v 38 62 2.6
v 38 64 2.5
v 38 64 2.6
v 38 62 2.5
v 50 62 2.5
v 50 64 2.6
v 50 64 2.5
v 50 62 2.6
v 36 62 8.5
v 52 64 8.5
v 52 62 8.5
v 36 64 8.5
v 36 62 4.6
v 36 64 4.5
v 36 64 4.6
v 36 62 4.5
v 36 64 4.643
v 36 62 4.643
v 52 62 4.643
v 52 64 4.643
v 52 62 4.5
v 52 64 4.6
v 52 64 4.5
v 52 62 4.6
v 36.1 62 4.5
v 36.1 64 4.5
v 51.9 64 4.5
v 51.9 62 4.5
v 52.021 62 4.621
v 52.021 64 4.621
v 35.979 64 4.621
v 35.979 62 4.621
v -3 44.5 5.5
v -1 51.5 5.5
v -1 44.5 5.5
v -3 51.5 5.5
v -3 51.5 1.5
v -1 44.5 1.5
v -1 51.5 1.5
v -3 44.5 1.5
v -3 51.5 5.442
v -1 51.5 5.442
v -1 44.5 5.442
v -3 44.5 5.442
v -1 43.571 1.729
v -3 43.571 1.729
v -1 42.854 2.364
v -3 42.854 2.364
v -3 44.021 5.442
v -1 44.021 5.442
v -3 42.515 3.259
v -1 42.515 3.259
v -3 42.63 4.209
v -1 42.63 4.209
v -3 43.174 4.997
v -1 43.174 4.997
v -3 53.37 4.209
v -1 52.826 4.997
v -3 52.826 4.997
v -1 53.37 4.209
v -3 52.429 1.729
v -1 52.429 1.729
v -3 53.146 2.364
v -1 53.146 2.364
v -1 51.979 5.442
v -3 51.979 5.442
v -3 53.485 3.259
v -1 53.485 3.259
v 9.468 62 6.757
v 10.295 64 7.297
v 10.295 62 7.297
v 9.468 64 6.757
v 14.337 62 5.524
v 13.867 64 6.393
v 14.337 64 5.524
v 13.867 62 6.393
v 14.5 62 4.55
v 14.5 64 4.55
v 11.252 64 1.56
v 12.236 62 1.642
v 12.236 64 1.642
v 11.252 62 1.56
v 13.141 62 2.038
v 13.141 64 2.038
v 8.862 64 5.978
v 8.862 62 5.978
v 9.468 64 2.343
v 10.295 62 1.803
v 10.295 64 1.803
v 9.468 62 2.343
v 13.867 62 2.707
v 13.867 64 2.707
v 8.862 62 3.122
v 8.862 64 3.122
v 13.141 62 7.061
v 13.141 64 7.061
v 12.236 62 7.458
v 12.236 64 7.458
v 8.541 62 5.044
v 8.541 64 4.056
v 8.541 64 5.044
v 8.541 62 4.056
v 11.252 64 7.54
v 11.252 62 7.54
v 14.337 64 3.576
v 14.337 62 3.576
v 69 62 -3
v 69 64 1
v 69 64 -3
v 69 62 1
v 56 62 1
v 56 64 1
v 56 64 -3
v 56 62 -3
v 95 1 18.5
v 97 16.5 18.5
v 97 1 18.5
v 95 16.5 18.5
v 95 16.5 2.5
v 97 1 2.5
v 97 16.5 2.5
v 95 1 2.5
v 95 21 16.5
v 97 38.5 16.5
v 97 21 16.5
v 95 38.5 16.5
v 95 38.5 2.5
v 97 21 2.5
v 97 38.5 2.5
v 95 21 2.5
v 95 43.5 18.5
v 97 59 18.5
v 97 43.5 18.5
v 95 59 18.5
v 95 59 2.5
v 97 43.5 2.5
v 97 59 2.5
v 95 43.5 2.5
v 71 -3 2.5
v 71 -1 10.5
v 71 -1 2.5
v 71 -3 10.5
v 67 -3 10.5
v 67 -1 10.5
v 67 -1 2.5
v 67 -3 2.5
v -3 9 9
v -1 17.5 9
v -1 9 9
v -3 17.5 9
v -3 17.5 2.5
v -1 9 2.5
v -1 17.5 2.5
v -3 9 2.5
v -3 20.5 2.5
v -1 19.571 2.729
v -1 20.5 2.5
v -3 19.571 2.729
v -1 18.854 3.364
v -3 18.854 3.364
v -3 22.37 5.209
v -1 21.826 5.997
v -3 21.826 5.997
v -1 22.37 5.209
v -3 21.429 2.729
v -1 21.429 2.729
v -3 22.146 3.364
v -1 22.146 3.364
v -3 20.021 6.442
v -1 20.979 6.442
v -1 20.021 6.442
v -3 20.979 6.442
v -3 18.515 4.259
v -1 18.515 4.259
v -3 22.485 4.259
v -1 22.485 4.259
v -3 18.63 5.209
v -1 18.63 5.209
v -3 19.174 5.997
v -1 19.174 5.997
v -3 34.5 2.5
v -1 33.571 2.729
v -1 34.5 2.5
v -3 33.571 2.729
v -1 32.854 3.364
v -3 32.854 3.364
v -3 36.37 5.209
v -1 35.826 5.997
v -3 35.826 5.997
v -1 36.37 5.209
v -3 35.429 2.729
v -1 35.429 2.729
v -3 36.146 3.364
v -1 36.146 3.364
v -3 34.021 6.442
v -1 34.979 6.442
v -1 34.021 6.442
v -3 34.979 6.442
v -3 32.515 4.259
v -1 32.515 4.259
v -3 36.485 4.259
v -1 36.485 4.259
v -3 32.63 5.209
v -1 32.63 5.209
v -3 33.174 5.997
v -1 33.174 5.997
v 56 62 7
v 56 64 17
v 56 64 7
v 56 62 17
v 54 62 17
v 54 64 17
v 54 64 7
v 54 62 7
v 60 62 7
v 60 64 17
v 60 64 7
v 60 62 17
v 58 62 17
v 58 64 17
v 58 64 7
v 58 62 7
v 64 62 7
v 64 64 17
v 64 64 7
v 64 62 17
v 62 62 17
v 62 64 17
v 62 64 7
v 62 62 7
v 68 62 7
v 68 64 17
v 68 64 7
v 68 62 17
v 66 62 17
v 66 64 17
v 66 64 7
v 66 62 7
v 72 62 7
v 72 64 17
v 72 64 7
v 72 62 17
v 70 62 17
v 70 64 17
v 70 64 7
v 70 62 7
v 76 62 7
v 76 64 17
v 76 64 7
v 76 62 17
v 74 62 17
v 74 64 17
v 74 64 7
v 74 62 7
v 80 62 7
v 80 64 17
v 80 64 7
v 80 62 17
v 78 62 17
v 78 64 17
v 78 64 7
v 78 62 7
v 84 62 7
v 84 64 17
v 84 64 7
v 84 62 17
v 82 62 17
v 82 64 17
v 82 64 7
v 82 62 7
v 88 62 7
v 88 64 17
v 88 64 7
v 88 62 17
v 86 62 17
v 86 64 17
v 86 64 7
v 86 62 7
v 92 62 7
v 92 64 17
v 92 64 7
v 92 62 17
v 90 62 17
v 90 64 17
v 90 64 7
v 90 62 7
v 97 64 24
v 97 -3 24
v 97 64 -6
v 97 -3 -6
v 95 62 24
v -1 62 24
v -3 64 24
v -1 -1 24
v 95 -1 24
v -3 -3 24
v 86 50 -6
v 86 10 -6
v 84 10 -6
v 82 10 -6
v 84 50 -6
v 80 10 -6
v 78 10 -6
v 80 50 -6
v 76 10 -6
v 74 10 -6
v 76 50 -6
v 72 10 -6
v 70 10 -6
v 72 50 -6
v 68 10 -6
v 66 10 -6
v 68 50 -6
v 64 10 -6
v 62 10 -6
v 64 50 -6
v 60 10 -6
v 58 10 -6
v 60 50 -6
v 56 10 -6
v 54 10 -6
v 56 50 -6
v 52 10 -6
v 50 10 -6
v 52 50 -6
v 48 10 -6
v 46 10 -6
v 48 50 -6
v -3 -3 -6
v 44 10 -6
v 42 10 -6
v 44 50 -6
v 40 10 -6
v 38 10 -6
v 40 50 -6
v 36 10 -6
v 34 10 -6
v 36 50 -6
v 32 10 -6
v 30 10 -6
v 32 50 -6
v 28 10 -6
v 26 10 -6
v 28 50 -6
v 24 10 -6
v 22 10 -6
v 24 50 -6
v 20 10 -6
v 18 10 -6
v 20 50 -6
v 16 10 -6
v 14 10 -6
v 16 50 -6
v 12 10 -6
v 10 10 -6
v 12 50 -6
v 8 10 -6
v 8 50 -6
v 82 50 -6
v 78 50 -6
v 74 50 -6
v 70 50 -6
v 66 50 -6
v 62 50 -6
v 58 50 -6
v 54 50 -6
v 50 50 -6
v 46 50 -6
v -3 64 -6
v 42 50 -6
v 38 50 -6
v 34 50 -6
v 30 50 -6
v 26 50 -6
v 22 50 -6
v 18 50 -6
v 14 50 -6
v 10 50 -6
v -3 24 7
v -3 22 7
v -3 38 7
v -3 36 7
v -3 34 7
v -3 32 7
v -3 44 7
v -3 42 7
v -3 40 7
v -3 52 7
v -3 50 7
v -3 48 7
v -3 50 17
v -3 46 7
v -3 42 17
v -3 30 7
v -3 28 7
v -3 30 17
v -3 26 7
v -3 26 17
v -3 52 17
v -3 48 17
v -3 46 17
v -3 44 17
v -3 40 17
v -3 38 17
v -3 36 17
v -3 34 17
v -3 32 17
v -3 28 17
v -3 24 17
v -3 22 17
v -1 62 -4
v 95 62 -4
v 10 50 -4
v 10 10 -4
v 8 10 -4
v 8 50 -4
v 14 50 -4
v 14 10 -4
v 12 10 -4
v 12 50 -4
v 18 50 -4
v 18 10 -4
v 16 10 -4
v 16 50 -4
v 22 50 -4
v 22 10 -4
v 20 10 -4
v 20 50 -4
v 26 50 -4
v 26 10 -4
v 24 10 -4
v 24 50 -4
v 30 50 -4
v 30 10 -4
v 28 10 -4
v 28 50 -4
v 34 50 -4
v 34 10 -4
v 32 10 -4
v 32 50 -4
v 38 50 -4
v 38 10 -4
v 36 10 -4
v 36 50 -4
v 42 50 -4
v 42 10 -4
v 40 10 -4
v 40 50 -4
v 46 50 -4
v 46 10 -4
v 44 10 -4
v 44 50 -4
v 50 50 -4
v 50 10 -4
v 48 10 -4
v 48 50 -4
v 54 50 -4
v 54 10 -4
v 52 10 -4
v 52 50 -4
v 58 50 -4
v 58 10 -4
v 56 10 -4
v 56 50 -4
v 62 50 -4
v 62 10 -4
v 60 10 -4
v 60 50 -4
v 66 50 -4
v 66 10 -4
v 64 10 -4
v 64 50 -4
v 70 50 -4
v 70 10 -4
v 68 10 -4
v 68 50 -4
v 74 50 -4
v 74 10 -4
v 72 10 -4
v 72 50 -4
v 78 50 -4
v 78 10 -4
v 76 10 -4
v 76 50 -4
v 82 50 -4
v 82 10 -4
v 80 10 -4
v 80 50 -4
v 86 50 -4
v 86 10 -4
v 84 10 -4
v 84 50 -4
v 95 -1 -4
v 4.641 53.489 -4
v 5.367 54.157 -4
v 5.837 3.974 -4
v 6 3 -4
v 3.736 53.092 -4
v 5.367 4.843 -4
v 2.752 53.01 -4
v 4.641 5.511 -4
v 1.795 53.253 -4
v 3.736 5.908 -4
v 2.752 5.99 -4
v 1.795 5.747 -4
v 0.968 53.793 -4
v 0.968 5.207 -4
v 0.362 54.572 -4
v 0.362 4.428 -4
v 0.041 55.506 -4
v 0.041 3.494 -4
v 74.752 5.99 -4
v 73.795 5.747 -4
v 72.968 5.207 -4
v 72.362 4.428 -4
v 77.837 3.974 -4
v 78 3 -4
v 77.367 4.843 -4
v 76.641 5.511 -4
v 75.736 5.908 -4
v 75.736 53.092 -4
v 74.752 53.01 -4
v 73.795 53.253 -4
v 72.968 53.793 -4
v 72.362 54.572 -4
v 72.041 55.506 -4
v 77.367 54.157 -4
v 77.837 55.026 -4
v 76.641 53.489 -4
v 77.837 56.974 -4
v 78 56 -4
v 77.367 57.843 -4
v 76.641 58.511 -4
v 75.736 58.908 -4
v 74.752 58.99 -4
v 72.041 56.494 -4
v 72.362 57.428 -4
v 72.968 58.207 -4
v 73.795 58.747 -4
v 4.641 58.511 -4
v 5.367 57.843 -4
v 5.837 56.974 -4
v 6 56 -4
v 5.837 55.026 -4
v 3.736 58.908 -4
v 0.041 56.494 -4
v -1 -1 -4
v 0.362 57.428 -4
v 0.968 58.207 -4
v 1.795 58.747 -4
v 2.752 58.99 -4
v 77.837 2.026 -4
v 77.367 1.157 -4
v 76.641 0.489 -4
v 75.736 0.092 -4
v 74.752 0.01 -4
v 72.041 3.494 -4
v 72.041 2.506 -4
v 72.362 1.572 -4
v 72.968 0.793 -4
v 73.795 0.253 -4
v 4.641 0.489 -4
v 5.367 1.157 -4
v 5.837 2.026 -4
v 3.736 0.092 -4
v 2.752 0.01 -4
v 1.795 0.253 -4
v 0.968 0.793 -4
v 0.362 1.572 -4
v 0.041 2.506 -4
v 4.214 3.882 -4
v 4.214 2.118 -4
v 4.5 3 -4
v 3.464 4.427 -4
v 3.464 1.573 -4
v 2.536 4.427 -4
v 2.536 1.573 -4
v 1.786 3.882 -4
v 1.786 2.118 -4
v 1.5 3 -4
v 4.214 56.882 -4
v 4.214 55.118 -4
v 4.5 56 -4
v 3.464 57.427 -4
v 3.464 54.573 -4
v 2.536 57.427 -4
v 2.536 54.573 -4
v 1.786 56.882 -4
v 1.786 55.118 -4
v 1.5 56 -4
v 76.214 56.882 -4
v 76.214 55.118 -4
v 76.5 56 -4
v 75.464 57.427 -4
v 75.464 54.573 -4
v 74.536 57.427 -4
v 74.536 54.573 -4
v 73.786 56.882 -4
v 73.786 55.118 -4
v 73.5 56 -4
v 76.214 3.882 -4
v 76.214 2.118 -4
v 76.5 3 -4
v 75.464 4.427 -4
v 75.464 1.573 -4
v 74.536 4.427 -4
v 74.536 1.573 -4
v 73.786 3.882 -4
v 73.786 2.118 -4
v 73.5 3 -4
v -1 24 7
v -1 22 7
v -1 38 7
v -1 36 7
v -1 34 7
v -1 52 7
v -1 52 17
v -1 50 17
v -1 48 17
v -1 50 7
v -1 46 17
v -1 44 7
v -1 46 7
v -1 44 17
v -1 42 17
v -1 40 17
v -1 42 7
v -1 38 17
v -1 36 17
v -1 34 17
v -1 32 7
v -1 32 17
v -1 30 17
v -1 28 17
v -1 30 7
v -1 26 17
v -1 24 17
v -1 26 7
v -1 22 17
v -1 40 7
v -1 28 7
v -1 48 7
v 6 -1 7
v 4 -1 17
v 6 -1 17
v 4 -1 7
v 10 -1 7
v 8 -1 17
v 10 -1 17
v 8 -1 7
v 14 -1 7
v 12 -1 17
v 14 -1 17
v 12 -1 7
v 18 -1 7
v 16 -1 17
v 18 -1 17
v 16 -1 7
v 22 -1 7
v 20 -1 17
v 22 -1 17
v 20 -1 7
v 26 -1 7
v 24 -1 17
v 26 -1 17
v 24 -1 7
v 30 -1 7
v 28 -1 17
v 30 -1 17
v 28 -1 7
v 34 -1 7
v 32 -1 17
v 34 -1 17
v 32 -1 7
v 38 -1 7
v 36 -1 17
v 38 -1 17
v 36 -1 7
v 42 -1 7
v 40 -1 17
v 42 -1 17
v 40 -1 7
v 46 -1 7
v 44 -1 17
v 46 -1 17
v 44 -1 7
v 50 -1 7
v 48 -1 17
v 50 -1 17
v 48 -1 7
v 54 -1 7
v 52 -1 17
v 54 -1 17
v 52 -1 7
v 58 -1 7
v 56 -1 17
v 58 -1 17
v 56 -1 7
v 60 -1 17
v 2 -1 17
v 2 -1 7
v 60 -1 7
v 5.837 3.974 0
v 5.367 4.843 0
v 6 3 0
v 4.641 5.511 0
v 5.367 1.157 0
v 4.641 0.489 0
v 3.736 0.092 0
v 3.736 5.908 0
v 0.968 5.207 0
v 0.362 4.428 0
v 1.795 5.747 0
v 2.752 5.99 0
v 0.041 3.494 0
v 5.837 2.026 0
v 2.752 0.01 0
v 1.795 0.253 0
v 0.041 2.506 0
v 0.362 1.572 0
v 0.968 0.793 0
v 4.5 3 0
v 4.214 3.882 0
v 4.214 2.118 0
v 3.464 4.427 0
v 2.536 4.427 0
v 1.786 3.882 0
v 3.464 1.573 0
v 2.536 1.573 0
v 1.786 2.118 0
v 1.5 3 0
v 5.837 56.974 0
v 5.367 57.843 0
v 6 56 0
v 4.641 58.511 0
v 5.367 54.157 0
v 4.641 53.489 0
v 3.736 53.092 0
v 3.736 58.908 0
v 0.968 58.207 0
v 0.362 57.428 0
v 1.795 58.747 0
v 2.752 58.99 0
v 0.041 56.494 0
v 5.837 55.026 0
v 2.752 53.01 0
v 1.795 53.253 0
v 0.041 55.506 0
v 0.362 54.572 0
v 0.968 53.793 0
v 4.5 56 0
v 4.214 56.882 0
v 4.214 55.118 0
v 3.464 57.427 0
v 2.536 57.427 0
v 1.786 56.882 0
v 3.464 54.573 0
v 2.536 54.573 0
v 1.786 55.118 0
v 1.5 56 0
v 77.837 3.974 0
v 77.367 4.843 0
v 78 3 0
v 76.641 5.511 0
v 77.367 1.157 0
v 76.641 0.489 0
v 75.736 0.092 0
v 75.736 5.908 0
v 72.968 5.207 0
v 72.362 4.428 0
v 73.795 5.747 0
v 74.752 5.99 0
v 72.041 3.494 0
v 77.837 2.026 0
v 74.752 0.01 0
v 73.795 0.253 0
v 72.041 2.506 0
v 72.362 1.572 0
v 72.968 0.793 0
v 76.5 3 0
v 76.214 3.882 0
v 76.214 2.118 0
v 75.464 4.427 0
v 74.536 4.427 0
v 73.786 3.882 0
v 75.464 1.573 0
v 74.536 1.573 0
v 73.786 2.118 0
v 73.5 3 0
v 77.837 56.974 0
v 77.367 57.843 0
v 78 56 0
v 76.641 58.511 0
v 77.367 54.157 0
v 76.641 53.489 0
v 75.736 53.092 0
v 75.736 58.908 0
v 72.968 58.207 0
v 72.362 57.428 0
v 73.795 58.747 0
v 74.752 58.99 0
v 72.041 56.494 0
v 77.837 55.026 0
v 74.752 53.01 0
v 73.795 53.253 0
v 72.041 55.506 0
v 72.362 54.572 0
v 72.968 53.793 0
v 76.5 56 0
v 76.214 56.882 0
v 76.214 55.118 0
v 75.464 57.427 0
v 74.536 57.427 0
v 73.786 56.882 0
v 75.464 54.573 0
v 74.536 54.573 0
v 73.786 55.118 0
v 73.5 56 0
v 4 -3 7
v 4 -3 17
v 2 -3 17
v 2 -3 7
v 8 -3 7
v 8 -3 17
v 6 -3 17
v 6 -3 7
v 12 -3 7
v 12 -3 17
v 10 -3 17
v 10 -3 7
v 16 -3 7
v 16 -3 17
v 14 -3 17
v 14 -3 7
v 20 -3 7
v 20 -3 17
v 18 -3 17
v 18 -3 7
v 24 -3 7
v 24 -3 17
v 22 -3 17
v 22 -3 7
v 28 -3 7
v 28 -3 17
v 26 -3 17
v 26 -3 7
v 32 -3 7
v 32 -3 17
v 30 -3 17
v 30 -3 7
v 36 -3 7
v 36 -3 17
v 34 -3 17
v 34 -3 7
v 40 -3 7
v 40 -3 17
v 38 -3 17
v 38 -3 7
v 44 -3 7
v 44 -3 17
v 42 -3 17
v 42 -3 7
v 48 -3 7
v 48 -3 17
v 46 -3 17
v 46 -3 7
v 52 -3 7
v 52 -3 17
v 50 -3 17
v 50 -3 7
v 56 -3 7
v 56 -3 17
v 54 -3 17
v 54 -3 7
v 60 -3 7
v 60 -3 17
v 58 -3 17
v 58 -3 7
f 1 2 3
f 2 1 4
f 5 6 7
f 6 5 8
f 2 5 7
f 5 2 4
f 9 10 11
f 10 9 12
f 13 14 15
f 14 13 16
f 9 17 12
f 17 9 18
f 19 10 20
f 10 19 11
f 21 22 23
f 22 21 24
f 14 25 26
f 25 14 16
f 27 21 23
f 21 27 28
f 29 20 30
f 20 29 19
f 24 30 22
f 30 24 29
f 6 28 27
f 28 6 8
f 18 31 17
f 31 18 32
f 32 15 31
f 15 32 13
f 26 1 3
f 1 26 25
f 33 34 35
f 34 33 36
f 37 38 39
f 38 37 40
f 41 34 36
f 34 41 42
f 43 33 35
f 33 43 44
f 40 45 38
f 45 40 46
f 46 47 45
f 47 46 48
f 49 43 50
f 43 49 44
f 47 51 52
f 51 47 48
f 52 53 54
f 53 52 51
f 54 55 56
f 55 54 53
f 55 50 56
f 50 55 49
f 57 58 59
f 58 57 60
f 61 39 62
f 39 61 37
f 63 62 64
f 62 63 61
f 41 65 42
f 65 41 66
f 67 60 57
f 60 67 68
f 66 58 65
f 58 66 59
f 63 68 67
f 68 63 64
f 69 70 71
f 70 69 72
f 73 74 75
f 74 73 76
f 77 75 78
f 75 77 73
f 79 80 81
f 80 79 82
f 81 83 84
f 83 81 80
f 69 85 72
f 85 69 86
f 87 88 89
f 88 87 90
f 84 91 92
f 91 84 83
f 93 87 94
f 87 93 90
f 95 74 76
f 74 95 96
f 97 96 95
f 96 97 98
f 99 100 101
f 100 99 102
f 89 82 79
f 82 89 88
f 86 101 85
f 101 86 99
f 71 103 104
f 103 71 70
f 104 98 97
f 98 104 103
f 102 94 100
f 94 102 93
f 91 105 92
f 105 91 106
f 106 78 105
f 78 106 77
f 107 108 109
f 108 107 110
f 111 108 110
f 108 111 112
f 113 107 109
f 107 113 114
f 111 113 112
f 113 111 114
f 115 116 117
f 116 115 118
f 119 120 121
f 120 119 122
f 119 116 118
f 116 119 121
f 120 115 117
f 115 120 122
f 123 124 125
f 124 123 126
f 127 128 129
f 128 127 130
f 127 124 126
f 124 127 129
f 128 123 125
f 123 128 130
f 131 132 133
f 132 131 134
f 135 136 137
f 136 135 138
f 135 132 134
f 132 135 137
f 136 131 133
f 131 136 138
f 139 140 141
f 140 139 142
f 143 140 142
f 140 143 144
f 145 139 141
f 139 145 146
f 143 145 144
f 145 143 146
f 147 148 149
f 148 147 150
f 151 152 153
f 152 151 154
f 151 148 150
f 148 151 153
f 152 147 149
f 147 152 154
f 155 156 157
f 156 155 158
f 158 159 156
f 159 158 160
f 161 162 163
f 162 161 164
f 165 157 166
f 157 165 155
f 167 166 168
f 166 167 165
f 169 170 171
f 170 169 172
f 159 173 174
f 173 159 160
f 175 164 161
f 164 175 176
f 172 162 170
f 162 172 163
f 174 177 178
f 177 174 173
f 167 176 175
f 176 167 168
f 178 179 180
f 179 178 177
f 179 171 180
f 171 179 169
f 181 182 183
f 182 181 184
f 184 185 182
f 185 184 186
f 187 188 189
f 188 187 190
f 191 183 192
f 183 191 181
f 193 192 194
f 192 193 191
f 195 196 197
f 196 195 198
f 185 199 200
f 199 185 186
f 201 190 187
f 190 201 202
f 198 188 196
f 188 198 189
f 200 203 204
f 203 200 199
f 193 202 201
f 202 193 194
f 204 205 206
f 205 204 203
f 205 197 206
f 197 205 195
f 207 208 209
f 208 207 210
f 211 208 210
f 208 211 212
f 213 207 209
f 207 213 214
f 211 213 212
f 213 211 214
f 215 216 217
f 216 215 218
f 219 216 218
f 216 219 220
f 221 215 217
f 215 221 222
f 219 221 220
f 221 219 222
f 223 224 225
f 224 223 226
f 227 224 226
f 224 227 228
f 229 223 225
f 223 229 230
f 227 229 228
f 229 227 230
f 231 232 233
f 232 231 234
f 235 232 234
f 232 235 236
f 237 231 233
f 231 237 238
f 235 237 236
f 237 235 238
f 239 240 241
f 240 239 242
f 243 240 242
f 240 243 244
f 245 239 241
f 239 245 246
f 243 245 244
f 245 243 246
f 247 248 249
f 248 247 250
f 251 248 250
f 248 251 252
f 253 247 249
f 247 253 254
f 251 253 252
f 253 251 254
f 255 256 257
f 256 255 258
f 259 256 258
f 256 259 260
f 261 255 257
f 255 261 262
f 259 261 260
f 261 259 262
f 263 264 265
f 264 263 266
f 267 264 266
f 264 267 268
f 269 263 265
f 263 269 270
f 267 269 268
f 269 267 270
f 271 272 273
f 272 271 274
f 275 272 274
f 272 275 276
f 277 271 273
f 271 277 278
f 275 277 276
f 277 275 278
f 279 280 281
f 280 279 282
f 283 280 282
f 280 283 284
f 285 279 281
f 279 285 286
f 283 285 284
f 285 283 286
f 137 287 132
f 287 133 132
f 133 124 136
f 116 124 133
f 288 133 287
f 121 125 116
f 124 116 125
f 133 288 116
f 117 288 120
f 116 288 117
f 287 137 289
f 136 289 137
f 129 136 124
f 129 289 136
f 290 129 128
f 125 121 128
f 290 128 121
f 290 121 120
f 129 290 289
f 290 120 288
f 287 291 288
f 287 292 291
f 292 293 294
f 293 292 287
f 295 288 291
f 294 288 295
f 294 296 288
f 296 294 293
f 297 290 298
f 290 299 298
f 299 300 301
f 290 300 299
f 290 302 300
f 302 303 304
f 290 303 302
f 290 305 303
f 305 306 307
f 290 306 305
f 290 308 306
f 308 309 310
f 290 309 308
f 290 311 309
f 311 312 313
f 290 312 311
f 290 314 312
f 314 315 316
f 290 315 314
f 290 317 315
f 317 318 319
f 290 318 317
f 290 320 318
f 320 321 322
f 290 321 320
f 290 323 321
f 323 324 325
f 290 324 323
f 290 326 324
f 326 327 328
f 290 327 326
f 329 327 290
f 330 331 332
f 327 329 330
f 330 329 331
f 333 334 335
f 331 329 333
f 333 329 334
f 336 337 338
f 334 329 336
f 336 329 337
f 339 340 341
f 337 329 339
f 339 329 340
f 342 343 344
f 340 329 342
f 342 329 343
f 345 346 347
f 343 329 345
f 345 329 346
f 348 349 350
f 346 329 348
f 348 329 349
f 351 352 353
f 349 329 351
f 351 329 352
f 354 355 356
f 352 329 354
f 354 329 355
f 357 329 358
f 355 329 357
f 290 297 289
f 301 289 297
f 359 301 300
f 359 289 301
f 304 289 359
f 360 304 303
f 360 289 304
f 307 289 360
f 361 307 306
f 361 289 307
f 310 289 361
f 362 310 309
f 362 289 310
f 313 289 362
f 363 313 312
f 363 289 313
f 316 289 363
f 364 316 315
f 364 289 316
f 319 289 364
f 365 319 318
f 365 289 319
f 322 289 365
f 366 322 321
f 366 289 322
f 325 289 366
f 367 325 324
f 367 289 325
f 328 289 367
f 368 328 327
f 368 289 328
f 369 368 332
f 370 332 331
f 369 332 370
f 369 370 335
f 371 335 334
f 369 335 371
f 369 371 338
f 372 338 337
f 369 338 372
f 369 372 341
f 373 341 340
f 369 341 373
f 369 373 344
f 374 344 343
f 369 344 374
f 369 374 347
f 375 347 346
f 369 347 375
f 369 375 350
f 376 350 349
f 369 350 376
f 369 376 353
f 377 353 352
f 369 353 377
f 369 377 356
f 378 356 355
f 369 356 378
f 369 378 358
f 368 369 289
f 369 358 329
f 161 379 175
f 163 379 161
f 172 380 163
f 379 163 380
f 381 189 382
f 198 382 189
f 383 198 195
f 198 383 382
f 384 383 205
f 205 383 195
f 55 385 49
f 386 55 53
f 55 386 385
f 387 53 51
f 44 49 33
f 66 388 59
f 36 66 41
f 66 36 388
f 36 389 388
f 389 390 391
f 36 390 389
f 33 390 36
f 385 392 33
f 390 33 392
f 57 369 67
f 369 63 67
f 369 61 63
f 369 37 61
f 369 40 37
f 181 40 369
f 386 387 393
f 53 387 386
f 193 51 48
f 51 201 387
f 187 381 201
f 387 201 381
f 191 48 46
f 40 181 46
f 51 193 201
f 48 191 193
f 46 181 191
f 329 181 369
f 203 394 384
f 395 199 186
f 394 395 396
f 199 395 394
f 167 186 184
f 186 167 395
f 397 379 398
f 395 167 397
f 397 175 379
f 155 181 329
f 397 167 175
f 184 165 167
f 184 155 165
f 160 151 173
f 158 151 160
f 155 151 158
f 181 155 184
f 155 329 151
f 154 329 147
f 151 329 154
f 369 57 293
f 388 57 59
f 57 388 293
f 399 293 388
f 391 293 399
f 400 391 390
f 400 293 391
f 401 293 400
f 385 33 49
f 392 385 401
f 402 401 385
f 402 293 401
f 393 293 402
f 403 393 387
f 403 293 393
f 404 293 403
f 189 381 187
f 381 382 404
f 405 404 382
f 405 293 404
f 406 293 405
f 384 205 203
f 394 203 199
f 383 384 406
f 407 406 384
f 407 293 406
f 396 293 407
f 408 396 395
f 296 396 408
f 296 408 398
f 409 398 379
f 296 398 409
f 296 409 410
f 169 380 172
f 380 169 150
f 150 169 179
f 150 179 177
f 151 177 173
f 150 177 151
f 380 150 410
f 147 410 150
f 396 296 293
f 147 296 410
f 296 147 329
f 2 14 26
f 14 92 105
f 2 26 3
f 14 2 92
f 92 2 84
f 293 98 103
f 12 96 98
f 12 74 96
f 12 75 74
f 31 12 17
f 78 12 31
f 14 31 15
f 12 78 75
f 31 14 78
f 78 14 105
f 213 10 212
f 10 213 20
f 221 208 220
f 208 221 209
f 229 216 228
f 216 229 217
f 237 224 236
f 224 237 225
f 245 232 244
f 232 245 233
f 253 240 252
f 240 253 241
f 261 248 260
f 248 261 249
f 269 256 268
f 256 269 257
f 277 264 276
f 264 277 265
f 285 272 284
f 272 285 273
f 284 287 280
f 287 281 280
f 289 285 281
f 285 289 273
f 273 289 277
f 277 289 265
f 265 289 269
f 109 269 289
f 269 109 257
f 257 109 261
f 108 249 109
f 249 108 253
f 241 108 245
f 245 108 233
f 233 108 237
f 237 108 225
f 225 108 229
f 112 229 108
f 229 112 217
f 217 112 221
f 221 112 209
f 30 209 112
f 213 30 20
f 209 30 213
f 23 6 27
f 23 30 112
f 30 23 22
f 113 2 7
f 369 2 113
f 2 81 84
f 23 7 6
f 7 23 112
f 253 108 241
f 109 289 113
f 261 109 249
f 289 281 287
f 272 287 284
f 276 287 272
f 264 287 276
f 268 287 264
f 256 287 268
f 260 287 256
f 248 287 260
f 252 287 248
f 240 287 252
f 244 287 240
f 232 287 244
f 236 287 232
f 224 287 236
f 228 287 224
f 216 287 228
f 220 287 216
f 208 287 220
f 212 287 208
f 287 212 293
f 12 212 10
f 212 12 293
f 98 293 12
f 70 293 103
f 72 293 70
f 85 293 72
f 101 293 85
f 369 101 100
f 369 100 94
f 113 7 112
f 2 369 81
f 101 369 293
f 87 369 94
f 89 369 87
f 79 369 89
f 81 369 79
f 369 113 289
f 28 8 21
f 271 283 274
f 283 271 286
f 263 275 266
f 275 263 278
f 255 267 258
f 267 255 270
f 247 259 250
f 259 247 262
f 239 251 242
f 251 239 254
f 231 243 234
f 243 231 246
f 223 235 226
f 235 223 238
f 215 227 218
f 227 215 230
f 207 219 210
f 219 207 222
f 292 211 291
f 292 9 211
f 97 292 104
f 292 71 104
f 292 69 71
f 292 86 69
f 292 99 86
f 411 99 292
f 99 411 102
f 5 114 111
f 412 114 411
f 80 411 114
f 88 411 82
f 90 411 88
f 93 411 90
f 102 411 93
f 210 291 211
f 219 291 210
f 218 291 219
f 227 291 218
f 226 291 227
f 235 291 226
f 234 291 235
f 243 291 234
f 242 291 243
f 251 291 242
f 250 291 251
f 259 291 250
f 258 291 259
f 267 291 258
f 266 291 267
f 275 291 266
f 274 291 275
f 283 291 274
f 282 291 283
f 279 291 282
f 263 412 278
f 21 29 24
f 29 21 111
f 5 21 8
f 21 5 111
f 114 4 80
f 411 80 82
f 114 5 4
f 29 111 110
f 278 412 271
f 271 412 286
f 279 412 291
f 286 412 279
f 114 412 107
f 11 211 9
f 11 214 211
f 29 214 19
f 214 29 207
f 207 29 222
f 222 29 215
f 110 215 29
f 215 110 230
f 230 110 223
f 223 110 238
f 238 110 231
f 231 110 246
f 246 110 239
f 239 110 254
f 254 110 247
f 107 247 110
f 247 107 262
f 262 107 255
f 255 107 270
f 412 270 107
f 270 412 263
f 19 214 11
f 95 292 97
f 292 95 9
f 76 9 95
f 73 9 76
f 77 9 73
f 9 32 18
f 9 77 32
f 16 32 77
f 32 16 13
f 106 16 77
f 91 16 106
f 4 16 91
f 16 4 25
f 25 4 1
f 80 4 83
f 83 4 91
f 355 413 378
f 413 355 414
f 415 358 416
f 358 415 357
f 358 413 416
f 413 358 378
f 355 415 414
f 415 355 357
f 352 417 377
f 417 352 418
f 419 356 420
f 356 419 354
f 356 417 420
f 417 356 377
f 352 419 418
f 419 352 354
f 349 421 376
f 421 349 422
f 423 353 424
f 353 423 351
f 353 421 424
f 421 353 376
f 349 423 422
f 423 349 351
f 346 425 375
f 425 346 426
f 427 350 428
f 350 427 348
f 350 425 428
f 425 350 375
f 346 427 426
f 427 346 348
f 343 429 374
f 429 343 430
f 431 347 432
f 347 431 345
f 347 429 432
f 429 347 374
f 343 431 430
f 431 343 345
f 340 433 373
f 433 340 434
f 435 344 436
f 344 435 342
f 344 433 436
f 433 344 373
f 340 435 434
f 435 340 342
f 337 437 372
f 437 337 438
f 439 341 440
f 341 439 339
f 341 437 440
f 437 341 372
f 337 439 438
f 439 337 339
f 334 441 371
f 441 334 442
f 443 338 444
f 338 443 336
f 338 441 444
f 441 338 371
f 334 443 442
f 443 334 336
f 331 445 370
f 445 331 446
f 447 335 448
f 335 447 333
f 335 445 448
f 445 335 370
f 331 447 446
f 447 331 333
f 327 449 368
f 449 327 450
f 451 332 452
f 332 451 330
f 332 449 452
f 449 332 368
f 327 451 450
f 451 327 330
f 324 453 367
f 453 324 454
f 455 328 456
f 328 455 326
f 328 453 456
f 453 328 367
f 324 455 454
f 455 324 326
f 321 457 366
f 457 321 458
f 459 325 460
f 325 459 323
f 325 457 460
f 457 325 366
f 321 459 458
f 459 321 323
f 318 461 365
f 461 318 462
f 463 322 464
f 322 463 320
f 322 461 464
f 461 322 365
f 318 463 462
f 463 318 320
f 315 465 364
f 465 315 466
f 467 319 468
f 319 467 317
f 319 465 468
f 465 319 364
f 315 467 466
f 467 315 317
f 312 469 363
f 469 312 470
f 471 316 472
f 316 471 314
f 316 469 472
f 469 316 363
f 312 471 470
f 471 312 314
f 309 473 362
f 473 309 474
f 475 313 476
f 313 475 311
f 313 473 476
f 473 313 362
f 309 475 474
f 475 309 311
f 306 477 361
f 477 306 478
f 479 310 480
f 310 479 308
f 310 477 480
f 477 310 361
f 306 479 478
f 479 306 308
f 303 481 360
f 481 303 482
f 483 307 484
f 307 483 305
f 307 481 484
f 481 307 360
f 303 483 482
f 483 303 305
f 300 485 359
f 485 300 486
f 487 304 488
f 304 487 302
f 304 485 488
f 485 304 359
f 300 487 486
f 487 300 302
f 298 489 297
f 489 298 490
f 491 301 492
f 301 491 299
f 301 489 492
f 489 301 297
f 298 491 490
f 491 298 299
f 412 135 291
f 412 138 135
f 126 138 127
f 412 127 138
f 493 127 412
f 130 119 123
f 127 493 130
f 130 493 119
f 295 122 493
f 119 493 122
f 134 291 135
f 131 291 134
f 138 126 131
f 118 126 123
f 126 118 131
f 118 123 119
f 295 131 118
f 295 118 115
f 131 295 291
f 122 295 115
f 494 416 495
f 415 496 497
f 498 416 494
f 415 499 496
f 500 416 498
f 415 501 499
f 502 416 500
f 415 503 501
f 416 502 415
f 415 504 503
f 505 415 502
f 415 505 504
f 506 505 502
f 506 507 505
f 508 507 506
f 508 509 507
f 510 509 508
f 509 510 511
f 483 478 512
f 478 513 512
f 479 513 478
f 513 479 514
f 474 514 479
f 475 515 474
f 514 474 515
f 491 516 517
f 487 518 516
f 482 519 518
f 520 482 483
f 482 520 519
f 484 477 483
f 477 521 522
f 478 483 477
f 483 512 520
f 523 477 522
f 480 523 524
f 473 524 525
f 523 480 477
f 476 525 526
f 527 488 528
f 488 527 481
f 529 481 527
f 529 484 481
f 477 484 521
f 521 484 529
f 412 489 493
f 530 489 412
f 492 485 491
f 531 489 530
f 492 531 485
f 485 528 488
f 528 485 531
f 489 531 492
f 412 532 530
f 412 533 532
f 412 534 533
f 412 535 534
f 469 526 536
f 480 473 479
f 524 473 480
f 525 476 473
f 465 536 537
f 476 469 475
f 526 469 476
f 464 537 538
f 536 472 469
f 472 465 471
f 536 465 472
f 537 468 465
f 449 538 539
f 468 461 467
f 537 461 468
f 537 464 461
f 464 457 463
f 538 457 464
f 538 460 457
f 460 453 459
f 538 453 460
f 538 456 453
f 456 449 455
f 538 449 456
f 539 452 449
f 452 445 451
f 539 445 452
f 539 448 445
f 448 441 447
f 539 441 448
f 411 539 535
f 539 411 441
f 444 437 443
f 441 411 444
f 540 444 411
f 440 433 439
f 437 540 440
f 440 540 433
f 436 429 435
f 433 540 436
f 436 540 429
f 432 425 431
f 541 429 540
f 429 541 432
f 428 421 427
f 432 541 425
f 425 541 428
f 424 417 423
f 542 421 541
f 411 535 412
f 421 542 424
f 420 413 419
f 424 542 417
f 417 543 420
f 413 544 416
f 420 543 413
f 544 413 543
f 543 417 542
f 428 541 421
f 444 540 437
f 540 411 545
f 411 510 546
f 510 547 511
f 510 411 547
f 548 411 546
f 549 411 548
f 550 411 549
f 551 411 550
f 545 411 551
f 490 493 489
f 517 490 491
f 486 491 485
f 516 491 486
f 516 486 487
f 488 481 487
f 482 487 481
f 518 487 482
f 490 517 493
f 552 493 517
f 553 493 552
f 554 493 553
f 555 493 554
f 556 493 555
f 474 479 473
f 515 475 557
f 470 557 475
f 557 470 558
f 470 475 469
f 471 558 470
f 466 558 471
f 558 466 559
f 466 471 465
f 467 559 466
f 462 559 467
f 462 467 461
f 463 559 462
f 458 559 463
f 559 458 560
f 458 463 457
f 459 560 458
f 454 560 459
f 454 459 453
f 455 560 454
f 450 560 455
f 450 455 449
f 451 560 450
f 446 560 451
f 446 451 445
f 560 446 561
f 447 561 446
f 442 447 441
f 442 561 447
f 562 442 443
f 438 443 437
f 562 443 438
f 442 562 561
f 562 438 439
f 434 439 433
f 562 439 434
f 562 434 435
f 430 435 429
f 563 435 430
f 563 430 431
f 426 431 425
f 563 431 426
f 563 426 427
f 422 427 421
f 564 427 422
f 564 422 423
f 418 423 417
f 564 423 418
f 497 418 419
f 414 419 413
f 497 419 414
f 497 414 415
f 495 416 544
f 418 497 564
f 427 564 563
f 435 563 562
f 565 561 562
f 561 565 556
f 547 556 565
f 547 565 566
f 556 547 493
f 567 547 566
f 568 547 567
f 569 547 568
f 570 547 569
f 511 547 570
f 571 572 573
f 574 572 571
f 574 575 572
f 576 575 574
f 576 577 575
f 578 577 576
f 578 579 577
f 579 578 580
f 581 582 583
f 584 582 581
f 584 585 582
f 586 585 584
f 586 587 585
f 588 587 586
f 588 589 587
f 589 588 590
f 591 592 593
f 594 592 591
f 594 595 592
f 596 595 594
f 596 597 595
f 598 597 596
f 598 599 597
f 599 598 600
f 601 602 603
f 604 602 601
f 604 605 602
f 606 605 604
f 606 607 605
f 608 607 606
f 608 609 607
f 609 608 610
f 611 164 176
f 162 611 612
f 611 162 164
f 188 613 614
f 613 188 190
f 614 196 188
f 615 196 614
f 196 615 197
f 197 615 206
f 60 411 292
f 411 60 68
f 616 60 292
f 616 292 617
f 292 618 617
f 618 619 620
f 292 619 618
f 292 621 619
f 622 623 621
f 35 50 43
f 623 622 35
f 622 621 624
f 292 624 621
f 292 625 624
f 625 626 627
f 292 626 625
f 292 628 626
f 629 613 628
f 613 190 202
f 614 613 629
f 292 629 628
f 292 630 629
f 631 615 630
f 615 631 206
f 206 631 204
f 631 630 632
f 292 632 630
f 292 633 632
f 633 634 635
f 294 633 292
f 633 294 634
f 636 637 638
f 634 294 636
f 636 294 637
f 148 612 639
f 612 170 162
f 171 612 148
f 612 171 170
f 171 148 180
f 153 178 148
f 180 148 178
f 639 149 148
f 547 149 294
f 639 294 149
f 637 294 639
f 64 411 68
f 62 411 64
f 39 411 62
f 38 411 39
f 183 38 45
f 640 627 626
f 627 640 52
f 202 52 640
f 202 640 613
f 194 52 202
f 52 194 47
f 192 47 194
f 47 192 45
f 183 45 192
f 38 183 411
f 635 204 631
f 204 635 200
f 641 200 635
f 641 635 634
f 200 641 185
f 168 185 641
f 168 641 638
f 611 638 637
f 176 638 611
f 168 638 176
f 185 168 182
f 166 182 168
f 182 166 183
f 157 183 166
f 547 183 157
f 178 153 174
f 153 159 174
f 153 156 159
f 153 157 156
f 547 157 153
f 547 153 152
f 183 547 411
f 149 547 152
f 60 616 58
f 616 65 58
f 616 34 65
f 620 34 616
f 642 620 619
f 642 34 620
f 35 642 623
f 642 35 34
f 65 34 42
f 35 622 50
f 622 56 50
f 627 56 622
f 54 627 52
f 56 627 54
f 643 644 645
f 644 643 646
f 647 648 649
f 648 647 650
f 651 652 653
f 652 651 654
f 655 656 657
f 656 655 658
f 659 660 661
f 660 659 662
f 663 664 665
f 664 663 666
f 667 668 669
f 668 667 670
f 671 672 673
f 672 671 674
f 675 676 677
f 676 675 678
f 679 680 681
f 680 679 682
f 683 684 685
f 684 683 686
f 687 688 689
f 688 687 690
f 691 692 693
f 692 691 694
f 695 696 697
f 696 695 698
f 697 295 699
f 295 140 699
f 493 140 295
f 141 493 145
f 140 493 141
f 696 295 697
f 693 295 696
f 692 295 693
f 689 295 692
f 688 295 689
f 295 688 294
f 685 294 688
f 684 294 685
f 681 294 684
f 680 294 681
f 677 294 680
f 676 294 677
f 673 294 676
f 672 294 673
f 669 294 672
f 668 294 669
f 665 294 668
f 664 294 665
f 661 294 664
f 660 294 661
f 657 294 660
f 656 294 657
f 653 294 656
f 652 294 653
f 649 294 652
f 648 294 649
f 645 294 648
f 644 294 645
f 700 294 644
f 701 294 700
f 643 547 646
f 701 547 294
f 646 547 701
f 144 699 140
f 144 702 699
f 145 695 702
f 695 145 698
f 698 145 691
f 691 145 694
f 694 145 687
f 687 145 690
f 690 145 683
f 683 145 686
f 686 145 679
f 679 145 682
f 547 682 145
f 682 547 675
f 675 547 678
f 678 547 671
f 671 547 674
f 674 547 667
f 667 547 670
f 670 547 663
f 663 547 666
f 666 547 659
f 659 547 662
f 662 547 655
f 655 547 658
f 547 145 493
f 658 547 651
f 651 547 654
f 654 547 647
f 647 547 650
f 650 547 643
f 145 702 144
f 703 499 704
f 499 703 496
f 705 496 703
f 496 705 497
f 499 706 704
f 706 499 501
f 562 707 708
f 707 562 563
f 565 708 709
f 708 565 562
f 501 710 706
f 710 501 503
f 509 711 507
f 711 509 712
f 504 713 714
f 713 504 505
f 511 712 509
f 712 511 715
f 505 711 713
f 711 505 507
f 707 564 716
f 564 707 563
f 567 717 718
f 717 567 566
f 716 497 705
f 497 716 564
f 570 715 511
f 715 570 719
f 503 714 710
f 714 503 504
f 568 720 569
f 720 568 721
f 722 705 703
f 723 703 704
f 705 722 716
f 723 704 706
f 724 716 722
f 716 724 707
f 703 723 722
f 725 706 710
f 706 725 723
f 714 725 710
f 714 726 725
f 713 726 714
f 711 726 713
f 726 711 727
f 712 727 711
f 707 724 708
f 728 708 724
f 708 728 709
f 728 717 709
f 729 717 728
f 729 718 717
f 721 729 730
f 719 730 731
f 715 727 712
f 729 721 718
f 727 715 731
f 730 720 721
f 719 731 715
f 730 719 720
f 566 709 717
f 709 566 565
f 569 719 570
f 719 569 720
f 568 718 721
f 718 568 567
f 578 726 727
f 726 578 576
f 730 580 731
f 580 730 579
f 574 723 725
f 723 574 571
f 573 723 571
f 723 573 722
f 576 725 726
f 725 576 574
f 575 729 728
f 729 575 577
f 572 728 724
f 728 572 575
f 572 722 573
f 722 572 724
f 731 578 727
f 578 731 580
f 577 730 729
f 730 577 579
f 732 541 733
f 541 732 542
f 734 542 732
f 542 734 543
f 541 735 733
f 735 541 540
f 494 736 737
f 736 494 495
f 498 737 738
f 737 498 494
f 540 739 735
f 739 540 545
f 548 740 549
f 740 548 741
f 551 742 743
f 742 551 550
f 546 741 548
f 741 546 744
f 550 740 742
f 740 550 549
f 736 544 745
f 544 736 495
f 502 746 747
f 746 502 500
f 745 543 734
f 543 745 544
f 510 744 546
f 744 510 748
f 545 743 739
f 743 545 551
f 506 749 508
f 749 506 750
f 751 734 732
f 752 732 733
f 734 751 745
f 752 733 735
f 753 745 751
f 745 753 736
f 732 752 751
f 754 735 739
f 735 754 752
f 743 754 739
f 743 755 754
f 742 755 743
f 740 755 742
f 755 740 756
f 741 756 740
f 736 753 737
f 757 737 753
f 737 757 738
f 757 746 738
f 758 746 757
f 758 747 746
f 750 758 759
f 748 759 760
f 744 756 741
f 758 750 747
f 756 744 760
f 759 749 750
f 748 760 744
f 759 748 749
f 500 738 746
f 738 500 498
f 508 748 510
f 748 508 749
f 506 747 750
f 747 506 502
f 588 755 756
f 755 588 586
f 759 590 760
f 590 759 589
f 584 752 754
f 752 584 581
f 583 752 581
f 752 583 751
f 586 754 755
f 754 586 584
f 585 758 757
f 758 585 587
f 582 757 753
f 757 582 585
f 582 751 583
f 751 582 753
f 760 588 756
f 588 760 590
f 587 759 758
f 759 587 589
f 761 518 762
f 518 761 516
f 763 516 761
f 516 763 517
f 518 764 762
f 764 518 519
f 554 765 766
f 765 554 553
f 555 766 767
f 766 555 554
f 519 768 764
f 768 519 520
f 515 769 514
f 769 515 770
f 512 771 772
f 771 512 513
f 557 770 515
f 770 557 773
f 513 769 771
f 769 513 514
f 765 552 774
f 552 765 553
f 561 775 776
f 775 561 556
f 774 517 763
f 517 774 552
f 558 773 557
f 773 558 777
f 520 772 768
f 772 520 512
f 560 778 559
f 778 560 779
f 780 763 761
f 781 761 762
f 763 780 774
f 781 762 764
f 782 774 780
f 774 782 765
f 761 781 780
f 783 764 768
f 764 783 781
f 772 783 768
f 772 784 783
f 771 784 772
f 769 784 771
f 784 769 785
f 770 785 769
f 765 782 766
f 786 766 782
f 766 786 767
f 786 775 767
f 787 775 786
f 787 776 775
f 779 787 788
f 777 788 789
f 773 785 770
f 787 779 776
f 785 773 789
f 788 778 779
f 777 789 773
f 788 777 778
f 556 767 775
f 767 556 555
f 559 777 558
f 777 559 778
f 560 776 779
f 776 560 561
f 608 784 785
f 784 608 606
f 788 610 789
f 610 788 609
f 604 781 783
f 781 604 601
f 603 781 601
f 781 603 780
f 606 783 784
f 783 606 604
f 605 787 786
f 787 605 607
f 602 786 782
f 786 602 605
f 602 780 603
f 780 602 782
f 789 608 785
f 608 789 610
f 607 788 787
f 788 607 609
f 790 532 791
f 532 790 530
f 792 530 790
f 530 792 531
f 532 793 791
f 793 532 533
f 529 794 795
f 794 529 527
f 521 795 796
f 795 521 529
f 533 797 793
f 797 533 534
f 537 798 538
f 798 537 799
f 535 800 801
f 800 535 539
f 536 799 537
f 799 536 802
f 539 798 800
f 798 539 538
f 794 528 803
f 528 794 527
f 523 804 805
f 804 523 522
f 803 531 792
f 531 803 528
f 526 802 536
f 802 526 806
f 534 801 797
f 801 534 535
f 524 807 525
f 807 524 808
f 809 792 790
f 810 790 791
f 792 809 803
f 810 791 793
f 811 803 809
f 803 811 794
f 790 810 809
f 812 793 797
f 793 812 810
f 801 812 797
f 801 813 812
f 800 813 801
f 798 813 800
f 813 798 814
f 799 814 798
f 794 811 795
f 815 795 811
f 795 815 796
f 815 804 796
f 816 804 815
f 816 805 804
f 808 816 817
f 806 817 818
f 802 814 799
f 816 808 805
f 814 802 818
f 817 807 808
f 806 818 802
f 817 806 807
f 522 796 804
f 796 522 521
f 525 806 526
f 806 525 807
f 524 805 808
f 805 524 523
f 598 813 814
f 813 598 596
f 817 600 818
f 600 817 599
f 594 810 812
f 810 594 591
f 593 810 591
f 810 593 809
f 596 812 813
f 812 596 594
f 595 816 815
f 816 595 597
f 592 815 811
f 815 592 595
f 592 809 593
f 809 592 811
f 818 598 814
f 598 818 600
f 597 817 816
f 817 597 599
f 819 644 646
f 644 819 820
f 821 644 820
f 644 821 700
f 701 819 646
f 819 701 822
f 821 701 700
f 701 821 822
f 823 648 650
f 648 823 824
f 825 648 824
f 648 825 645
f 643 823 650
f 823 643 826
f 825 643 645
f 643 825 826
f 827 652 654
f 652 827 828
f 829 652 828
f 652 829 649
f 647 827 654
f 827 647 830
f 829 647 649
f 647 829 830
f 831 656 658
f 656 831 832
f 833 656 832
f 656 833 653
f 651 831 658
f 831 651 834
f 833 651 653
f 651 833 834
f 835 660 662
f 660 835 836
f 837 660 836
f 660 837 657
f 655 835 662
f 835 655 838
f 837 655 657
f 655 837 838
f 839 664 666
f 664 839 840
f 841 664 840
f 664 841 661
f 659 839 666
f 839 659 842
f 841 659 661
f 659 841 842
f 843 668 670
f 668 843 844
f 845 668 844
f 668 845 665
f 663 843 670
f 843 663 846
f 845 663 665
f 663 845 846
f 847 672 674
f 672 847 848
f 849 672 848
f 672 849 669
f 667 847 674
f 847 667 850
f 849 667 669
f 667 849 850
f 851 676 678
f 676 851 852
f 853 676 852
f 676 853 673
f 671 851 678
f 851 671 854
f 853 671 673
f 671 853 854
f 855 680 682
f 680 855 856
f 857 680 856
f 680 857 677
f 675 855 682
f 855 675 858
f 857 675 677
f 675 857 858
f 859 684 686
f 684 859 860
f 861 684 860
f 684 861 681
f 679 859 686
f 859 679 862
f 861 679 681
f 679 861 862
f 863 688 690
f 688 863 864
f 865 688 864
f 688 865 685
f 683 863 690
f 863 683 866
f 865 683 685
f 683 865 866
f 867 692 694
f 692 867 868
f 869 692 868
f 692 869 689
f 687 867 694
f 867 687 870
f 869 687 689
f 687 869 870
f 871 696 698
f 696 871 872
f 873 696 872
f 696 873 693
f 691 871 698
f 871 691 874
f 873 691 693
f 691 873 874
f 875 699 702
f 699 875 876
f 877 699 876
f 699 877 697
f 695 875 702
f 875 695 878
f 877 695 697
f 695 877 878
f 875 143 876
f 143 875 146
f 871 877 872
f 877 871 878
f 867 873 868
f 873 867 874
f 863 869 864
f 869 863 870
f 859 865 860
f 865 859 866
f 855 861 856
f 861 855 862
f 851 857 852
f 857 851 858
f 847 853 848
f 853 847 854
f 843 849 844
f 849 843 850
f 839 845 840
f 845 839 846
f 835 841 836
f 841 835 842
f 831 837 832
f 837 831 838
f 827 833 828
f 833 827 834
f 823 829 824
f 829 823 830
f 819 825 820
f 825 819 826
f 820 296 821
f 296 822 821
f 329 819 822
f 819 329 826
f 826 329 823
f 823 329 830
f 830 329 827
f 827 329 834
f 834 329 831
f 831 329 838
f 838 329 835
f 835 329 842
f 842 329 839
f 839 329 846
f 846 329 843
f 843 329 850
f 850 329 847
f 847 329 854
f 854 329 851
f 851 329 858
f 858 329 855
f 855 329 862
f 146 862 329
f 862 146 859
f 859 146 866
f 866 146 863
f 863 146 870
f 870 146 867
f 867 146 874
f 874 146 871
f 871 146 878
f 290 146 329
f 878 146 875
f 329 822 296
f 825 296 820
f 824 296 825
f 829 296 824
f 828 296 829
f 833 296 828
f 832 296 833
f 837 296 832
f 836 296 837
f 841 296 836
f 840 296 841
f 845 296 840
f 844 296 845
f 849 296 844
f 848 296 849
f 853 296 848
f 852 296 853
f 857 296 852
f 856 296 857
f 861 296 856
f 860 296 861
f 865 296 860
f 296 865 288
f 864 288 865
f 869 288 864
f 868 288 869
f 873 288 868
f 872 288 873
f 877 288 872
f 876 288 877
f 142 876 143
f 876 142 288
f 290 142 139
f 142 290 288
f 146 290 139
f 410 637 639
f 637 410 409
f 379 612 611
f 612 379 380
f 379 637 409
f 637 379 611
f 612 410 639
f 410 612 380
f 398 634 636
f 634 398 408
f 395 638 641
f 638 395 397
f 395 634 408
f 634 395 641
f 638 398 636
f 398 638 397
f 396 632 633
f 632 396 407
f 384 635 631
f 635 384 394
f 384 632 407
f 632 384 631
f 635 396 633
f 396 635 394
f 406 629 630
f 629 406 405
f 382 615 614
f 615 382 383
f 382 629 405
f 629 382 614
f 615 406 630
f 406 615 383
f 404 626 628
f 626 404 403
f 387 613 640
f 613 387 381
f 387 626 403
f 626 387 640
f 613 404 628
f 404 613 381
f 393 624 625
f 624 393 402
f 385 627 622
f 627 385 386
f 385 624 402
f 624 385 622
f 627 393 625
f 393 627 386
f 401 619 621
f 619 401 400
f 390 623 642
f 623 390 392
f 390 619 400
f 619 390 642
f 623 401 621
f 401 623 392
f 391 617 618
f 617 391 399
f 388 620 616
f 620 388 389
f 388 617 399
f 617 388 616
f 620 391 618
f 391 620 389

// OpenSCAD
$fa = 2;
$fs = 1;

// Orange Pi Win case
// http://www.orangepi.org/orangepiwiki/index.php/Orange_Pi_Win_Plus

opiwin = false;

back = true;
base = true;
front = true;
lside = true;
rside = true;
top = false;

display = false;
displayfront = false;

module OPiWin() {

   // body
   cube([93.5, 60, 20]);
   color([1,0,0,1]) {
   
      // Jack
      translate([11.5, 65, 4.55]) rotate([90, 0, 0]) cylinder(20, 3, 3);
   
      // HDMI
      translate([54.5, 45, 2.5])
         rotate([0, 270, 0]) 
         {   
         translate([0, 0, 4.5]) cube([2.5, 20, 12]);
         translate([2, 0, 2.5]) cube([4, 20, 16]);
         translate([0, 0, 4.6]) rotate([0, 45, 0]) cube([3, 20, 3]);
         translate([0, 0, 16.4]) rotate([0, 45, 0]) cube([3, 20, 3]);
         }   
         
      // SD card
      translate([56, 45, -3]) cube([13, 20, 4]);
      
            
      // USB 1
      translate([79, 1, 2.5]) cube([20, 15.5, 16]);
      
      // UTP
      translate([79, 21, 2.5]) cube([20, 17.5, 14]);

      // USB 2
      translate([79, 43.5, 2.5]) cube([20, 15.5, 16]);
      
      
      // Infra
      translate([67, -4, 2.5]) cube([4, 10, 8]);


      // Power
      translate([-4, 9, 2.5]) cube([20, 8.5, 6.5]);
      
      // switch 1
      translate([-4, 20.5, 4.5]) rotate([0, 90, 0]) cylinder(20, 2, 2);

      // switch 2
      translate([-4, 34.5, 4.5]) rotate([0, 90, 0]) cylinder(20, 2, 2);
     
      // USB
      translate([0, 9, 0]) {
         translate([-4, 35.5, 1.5]) cube([20, 7, 4]);
         translate([-4, 35.5, 3.5]) rotate([0, 90, 0]) cylinder(20, 2, 2);
         translate([-4, 42.5, 3.5]) rotate([0, 90, 0]) cylinder(20, 2, 2);
      }
   }      
}

module Front() {
   difference() {
      translate([-3, -3, -6]) cube([100, 2, 30]);
      
      OPiWin();

      translate([0, -6, 7])
         for(i = [1: 2: 30])
            translate([i * 2, 0, 0])
               cube([2, 10, 10]);
    }
}

module Base() {
color([1,0,0,1])
   difference() {
      translate([-1, -1, -6]) cube([96, 63, 2]);
      translate([6, 10, -10])
         for(i = [1: 2: 40])
            translate([i * 2, 0, 0])
               cube([2, 40, 10]);
      }
   
  // base
  translate([3, 3, -4])
  difference(){
    cylinder(4, 3, 3);
    cylinder(4, 1.5, 1.5);
  }
  translate([3, 56, -4])
  difference(){
    cylinder(4, 3, 3);
    cylinder(4, 1.5, 1.5);
  }
  translate([75, 3, -4])
  difference(){
    cylinder(4, 3, 3);
    cylinder(4, 1.5, 1.5);
  }
  translate([75, 56, -4])
  difference(){
    cylinder(4, 3, 3);
    cylinder(4, 1.5, 1.5);
  }
}

module Back() {
   difference() {
      translate([-3, 62, -6]) cube([100, 2, 30]);
      OPiWin();

      translate([52, 57, 7])
         for(i = [1: 2: 20])
            translate([i * 2, 0, 0])
               cube([2, 10, 10]);

     }
}

module LSide() {
   difference() {
      translate([-3, -1, -6]) cube([2, 63, 30]);
      
      OPiWin();      
      
      translate([-4, 20, 7])
         for(i = [1: 2: 15])
            translate([0, i * 2, 0])
               cube([10, 2, 10]);
    }
}

module RSide() {
  difference() {
    translate([95, -1, -6]) cube([2, 63, 30]);
    OPiWin();
  }
}

module Top() {
  color([1,0,0,1]) {
  difference() {
    translate([-1, -1, 19]) cube([96, 63, 5]);
    translate([0, 0, 19]) cube([94, 61, 5]);
    }
  difference() {  
    translate([-3, -3, 24]) cube([100, 67, 2]);    
    
    translate([6, 10, 22])
      for(i = [1: 2: 40])
         translate([i * 2, 0, 0])
            cube([2, 40, 10]);
    }
    }
}

module Display() {

   // slot
  difference() {
    translate([-1, -1, 19]) cube([96, 63, 5]);
    translate([0, 0, 19]) cube([94, 61, 5]);
    }

   // base
   difference() {
      translate([-10, -3, 24]) cube([113, 67, 2]);
      translate([0, 0, 24]) cube([88, 60, 10]);
   }

   // left side
   difference() {
      translate([-10, 60, 26])
         rotate([120, 0, 0]) cube([2, 66, 66]);
      translate([-17, -20, -10]) cube([10, 80, 35]);
      translate([-17, -33, 10]) cube([10, 30, 60]);
   }

   // right side
   translate([111, 0, 0])
      difference() {
         translate([-10, 60, 26])
            rotate([120, 0, 0]) cube([2, 66, 66]);
      
         translate([-17, -20, -10]) cube([10, 80, 35]);
    
         translate([-17, -33, 10]) cube([10, 30, 60]);
      }

   // back
   difference() {
      translate([-10, -3, 26]) cube([111, 2, 40]);
      translate([-7, -5, 30])
         for(i = [1: 2: 52])
            translate([i * 2, 0, 0]) cube([2, 10, 30]);      
   }
    
   // top
   translate([-10, 28, 81.5])
      rotate([120, 0, 0]) {
         difference() {
            cube([112, 2, 34.5]);
            translate([30, 0, 2]) cube([27, 10, 3]);
         }
         translate([2, -2, 2]) cube([27, 2, 3]);
         translate([58, -2, 2]) cube([54, 2, 3]);
      }
    
}

module DisplayFront() {
   // front
   translate([-10, 62, 25])
      rotate([-60, 0, 0])
         difference() {
            translate([0, -66, 0]) cube([113, 65, 2]); 
            translate([8, -64, 0]) cube([95, 61, 2]); 
         }

}

if(opiwin) OPiWin();
if(back) Back();
if(base) Base();
if(front) Front();
if(lside) LSide();
if(rside) RSide();
if(top) translate([0, 0, 2]) Top();
if(display) translate([0, 0, 2]) Display();
if(displayfront) translate([0, 0, 2]) DisplayFront();
